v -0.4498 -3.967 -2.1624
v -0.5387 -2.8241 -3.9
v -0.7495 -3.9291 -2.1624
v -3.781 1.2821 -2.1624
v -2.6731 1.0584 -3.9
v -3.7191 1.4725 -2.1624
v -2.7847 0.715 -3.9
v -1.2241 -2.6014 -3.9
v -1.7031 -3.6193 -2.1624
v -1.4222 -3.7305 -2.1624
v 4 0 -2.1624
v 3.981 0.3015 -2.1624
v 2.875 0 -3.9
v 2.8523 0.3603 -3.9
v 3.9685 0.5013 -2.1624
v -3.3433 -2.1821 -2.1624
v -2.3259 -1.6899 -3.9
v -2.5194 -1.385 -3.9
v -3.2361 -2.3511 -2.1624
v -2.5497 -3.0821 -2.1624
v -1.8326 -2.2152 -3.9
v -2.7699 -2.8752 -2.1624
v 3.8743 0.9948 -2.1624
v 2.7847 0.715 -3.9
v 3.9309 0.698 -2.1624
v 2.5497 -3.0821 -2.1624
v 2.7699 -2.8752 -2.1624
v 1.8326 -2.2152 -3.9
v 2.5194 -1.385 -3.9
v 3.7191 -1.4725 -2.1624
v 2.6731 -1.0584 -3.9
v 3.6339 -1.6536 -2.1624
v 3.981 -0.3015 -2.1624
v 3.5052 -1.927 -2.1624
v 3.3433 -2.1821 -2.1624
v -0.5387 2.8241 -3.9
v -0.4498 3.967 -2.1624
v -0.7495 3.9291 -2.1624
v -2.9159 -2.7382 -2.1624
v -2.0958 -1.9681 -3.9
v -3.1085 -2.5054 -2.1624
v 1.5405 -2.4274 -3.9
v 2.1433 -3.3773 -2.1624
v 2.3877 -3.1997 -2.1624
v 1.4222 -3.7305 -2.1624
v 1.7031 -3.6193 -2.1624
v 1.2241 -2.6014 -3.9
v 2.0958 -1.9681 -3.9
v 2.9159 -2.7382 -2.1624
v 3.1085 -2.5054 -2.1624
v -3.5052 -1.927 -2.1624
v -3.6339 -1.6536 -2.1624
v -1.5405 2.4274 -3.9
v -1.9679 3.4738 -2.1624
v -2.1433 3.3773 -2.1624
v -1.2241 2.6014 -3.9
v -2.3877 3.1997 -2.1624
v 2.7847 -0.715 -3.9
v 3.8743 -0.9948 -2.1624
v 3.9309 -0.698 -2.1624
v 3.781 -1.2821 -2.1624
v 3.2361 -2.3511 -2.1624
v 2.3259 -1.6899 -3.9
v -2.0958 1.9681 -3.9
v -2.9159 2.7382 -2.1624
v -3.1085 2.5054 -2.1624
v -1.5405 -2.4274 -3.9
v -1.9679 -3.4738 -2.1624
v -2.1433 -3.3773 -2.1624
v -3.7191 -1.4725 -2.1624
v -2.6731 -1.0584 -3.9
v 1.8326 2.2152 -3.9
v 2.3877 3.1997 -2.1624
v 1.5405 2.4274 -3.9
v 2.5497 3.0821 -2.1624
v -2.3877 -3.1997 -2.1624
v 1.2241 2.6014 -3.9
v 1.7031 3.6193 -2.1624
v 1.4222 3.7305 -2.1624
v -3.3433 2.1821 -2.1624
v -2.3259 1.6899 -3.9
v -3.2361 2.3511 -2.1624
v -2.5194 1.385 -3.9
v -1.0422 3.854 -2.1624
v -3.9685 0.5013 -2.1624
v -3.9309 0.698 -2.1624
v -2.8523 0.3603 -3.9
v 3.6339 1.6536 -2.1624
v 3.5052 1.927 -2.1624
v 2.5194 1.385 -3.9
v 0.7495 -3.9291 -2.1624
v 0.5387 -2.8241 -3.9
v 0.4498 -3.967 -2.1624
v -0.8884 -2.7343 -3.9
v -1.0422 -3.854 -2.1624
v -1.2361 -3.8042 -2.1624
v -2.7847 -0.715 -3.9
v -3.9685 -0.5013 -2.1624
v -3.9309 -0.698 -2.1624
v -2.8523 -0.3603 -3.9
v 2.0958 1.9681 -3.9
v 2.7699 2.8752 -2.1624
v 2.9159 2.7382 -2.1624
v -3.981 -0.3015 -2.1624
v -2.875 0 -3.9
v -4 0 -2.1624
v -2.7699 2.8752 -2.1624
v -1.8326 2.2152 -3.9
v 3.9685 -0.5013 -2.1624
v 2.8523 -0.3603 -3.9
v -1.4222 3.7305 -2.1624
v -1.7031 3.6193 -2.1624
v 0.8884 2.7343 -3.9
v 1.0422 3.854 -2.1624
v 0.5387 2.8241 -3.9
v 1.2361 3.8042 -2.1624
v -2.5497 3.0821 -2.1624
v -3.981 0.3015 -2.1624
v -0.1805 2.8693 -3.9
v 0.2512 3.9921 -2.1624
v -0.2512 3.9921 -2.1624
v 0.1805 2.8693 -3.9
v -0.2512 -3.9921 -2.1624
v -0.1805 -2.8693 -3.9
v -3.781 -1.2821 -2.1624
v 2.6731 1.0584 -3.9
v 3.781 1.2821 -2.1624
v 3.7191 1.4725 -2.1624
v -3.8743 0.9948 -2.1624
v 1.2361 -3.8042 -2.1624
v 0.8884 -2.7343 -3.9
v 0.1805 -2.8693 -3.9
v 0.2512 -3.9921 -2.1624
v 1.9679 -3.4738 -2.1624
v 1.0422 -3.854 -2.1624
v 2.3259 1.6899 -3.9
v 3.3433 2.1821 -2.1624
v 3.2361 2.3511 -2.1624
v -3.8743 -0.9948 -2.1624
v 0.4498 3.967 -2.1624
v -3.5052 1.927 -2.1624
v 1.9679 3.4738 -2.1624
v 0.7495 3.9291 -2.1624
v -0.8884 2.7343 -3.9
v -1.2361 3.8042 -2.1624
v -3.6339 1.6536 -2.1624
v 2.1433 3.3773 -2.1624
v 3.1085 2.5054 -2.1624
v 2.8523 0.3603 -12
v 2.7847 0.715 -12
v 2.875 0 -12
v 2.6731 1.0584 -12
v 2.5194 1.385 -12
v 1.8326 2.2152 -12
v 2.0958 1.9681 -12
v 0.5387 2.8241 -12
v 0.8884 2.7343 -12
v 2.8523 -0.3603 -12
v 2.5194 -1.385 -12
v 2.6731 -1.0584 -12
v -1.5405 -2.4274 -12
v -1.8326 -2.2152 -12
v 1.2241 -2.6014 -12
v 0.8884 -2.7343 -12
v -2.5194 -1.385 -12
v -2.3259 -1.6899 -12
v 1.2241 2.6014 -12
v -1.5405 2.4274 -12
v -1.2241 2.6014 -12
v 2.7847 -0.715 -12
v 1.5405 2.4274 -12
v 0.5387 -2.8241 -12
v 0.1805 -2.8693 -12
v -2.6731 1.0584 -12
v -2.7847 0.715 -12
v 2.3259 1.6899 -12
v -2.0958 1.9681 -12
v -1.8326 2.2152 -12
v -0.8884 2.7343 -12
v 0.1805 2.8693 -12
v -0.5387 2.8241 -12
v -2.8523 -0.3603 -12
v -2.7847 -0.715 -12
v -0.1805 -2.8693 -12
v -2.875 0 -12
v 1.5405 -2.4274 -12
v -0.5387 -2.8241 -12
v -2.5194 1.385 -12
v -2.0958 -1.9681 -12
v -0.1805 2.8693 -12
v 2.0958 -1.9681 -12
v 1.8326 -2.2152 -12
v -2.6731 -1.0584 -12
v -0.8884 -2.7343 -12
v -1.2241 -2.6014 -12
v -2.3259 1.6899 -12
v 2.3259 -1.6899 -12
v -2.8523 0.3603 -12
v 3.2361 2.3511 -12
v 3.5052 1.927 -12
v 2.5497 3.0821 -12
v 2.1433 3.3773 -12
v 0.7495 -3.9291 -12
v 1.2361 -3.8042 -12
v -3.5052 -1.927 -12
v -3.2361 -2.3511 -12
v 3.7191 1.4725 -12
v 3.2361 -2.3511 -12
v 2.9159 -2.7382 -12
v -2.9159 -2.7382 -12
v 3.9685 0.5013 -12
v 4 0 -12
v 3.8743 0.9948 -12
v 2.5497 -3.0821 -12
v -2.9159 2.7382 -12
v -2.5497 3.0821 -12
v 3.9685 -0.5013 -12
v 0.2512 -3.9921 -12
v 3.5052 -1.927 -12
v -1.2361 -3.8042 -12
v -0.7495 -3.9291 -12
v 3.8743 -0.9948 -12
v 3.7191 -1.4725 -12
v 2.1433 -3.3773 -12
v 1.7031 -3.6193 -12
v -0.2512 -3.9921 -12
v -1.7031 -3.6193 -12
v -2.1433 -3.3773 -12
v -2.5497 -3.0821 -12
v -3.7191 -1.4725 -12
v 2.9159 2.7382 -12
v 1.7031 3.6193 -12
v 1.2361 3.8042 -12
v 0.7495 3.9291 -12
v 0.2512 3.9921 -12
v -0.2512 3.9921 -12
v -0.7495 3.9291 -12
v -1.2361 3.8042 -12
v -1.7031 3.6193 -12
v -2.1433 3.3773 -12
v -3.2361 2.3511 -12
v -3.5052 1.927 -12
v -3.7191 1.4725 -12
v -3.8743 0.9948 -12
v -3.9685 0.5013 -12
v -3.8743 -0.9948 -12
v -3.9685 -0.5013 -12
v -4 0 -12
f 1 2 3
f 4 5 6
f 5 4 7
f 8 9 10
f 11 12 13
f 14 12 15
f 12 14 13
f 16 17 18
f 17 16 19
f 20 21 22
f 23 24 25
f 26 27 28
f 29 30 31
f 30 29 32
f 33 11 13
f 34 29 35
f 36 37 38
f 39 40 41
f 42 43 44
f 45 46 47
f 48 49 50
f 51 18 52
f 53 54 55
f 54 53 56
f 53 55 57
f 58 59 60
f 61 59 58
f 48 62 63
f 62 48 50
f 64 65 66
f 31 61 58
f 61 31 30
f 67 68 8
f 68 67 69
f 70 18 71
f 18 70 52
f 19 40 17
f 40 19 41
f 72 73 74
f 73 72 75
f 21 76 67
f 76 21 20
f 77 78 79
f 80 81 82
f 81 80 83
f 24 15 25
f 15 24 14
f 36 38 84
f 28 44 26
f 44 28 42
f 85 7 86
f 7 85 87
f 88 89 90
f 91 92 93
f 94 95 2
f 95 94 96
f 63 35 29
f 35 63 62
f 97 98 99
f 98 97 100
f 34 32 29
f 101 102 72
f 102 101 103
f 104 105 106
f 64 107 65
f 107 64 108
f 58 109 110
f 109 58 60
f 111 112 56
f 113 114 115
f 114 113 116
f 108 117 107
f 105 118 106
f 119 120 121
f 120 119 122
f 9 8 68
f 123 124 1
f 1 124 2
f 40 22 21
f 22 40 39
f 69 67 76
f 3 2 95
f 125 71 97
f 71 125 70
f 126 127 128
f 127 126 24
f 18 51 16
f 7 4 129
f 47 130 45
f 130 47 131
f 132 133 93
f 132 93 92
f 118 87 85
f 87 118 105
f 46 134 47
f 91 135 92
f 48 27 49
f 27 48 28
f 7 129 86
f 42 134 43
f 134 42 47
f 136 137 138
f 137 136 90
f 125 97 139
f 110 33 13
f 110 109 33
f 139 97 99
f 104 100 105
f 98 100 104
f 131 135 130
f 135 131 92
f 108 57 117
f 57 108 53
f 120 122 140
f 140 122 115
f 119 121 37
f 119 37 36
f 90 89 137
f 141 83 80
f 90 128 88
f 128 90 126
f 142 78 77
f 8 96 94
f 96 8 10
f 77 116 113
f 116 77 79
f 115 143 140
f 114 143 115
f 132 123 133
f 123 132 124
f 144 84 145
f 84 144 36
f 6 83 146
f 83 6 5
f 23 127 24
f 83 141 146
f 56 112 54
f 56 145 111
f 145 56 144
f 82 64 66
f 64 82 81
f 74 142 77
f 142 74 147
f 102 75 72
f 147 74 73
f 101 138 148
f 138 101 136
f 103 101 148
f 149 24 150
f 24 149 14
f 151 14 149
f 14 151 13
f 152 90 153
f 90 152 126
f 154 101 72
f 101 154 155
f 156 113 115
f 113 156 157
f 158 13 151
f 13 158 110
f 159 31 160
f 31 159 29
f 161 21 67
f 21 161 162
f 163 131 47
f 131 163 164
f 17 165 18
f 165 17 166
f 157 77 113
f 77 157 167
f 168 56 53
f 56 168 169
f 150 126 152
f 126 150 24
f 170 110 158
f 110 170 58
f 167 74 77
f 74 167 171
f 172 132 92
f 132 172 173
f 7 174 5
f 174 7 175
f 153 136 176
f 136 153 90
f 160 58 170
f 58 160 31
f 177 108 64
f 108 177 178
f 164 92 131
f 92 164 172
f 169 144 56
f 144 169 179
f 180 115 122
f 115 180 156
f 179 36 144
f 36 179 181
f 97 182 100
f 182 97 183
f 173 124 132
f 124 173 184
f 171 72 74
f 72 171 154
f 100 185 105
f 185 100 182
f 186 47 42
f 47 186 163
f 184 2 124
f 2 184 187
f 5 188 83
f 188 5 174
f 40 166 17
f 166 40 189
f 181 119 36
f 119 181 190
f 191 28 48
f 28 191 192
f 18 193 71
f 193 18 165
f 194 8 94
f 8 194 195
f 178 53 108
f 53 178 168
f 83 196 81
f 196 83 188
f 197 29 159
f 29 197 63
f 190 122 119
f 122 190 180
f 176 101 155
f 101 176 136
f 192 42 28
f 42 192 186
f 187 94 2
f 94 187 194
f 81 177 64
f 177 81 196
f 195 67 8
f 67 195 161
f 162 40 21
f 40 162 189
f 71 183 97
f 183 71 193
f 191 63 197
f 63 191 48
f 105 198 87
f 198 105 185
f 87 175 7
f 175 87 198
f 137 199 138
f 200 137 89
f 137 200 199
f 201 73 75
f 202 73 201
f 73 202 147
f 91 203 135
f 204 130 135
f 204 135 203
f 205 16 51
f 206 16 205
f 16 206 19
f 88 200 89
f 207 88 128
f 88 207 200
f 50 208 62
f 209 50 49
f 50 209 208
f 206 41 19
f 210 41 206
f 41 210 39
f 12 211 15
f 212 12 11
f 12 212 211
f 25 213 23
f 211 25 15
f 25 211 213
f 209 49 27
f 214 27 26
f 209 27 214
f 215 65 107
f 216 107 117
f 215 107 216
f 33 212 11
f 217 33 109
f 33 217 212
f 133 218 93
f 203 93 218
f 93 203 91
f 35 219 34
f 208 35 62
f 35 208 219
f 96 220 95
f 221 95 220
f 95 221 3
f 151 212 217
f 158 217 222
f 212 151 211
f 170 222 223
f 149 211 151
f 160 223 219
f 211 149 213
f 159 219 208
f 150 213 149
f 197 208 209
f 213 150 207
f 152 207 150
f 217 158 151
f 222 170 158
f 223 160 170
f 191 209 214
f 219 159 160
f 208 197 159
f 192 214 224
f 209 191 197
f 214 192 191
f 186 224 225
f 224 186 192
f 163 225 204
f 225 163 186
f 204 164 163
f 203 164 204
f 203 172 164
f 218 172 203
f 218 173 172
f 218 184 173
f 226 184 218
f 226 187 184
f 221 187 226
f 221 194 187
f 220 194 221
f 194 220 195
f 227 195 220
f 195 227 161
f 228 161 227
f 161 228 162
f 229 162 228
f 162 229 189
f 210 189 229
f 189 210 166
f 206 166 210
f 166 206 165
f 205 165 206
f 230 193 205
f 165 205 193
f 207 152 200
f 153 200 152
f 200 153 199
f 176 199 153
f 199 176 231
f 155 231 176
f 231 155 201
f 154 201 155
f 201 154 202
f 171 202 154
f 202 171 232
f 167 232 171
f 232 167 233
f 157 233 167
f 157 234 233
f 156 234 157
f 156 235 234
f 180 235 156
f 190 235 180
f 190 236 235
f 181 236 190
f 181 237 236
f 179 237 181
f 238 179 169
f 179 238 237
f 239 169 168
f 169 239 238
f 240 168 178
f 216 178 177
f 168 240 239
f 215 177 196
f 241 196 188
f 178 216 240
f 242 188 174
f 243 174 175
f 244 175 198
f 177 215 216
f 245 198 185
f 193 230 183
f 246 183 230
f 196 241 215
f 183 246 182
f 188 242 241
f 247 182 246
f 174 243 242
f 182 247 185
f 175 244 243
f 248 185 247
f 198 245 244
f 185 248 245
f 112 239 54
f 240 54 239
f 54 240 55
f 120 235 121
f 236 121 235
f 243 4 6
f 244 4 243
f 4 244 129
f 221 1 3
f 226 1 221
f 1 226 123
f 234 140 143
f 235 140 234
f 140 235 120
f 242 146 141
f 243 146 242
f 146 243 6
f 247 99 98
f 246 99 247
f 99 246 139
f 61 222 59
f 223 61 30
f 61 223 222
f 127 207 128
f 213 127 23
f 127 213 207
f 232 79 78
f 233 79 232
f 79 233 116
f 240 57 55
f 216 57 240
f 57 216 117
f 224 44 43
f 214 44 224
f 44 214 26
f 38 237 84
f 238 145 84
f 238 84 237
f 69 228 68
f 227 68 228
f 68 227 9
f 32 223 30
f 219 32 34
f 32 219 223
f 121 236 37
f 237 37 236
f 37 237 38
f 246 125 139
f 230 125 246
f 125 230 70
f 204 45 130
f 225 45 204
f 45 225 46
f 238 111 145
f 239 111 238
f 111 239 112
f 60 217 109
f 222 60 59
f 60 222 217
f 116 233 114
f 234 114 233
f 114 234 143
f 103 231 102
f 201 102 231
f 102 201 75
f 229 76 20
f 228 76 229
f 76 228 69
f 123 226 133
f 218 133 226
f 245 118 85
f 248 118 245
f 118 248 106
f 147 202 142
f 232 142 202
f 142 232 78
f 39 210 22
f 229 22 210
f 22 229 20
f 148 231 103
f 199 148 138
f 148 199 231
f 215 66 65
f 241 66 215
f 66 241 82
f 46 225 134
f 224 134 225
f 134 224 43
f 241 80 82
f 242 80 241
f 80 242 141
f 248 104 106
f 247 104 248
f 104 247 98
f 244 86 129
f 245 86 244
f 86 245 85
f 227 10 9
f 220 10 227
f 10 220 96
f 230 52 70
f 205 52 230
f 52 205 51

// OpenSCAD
$fn = 50;

difference() {
	union() {
		translate(v = [0, 0, -12.0]) {
			cylinder(h = 15, r = 4.0);
		}
	}
	union() {
		translate(v = [0, 0, 0]) {
			rotate(a = [0, 0, 0]) {
				difference() {
					union() {
						translate(v = [0, 0, -15.0]) {
							cylinder(h = 15, r = 2.6);
						}
						translate(v = [0, 0, -3.9]) {
							cylinder(h = 3.9, r1 = 2.875, r2 = 5.4);
						}
						translate(v = [0, 0, -15.0]) {
							cylinder(h = 15, r = 2.875);
						}
						translate(v = [0, 0, -15.0]) {
							cylinder(h = 15, r = 2.6);
						}
					}
					union();
				}
			}
		}
		#cylinder(h = 3, r = 5.0);
	}
}
